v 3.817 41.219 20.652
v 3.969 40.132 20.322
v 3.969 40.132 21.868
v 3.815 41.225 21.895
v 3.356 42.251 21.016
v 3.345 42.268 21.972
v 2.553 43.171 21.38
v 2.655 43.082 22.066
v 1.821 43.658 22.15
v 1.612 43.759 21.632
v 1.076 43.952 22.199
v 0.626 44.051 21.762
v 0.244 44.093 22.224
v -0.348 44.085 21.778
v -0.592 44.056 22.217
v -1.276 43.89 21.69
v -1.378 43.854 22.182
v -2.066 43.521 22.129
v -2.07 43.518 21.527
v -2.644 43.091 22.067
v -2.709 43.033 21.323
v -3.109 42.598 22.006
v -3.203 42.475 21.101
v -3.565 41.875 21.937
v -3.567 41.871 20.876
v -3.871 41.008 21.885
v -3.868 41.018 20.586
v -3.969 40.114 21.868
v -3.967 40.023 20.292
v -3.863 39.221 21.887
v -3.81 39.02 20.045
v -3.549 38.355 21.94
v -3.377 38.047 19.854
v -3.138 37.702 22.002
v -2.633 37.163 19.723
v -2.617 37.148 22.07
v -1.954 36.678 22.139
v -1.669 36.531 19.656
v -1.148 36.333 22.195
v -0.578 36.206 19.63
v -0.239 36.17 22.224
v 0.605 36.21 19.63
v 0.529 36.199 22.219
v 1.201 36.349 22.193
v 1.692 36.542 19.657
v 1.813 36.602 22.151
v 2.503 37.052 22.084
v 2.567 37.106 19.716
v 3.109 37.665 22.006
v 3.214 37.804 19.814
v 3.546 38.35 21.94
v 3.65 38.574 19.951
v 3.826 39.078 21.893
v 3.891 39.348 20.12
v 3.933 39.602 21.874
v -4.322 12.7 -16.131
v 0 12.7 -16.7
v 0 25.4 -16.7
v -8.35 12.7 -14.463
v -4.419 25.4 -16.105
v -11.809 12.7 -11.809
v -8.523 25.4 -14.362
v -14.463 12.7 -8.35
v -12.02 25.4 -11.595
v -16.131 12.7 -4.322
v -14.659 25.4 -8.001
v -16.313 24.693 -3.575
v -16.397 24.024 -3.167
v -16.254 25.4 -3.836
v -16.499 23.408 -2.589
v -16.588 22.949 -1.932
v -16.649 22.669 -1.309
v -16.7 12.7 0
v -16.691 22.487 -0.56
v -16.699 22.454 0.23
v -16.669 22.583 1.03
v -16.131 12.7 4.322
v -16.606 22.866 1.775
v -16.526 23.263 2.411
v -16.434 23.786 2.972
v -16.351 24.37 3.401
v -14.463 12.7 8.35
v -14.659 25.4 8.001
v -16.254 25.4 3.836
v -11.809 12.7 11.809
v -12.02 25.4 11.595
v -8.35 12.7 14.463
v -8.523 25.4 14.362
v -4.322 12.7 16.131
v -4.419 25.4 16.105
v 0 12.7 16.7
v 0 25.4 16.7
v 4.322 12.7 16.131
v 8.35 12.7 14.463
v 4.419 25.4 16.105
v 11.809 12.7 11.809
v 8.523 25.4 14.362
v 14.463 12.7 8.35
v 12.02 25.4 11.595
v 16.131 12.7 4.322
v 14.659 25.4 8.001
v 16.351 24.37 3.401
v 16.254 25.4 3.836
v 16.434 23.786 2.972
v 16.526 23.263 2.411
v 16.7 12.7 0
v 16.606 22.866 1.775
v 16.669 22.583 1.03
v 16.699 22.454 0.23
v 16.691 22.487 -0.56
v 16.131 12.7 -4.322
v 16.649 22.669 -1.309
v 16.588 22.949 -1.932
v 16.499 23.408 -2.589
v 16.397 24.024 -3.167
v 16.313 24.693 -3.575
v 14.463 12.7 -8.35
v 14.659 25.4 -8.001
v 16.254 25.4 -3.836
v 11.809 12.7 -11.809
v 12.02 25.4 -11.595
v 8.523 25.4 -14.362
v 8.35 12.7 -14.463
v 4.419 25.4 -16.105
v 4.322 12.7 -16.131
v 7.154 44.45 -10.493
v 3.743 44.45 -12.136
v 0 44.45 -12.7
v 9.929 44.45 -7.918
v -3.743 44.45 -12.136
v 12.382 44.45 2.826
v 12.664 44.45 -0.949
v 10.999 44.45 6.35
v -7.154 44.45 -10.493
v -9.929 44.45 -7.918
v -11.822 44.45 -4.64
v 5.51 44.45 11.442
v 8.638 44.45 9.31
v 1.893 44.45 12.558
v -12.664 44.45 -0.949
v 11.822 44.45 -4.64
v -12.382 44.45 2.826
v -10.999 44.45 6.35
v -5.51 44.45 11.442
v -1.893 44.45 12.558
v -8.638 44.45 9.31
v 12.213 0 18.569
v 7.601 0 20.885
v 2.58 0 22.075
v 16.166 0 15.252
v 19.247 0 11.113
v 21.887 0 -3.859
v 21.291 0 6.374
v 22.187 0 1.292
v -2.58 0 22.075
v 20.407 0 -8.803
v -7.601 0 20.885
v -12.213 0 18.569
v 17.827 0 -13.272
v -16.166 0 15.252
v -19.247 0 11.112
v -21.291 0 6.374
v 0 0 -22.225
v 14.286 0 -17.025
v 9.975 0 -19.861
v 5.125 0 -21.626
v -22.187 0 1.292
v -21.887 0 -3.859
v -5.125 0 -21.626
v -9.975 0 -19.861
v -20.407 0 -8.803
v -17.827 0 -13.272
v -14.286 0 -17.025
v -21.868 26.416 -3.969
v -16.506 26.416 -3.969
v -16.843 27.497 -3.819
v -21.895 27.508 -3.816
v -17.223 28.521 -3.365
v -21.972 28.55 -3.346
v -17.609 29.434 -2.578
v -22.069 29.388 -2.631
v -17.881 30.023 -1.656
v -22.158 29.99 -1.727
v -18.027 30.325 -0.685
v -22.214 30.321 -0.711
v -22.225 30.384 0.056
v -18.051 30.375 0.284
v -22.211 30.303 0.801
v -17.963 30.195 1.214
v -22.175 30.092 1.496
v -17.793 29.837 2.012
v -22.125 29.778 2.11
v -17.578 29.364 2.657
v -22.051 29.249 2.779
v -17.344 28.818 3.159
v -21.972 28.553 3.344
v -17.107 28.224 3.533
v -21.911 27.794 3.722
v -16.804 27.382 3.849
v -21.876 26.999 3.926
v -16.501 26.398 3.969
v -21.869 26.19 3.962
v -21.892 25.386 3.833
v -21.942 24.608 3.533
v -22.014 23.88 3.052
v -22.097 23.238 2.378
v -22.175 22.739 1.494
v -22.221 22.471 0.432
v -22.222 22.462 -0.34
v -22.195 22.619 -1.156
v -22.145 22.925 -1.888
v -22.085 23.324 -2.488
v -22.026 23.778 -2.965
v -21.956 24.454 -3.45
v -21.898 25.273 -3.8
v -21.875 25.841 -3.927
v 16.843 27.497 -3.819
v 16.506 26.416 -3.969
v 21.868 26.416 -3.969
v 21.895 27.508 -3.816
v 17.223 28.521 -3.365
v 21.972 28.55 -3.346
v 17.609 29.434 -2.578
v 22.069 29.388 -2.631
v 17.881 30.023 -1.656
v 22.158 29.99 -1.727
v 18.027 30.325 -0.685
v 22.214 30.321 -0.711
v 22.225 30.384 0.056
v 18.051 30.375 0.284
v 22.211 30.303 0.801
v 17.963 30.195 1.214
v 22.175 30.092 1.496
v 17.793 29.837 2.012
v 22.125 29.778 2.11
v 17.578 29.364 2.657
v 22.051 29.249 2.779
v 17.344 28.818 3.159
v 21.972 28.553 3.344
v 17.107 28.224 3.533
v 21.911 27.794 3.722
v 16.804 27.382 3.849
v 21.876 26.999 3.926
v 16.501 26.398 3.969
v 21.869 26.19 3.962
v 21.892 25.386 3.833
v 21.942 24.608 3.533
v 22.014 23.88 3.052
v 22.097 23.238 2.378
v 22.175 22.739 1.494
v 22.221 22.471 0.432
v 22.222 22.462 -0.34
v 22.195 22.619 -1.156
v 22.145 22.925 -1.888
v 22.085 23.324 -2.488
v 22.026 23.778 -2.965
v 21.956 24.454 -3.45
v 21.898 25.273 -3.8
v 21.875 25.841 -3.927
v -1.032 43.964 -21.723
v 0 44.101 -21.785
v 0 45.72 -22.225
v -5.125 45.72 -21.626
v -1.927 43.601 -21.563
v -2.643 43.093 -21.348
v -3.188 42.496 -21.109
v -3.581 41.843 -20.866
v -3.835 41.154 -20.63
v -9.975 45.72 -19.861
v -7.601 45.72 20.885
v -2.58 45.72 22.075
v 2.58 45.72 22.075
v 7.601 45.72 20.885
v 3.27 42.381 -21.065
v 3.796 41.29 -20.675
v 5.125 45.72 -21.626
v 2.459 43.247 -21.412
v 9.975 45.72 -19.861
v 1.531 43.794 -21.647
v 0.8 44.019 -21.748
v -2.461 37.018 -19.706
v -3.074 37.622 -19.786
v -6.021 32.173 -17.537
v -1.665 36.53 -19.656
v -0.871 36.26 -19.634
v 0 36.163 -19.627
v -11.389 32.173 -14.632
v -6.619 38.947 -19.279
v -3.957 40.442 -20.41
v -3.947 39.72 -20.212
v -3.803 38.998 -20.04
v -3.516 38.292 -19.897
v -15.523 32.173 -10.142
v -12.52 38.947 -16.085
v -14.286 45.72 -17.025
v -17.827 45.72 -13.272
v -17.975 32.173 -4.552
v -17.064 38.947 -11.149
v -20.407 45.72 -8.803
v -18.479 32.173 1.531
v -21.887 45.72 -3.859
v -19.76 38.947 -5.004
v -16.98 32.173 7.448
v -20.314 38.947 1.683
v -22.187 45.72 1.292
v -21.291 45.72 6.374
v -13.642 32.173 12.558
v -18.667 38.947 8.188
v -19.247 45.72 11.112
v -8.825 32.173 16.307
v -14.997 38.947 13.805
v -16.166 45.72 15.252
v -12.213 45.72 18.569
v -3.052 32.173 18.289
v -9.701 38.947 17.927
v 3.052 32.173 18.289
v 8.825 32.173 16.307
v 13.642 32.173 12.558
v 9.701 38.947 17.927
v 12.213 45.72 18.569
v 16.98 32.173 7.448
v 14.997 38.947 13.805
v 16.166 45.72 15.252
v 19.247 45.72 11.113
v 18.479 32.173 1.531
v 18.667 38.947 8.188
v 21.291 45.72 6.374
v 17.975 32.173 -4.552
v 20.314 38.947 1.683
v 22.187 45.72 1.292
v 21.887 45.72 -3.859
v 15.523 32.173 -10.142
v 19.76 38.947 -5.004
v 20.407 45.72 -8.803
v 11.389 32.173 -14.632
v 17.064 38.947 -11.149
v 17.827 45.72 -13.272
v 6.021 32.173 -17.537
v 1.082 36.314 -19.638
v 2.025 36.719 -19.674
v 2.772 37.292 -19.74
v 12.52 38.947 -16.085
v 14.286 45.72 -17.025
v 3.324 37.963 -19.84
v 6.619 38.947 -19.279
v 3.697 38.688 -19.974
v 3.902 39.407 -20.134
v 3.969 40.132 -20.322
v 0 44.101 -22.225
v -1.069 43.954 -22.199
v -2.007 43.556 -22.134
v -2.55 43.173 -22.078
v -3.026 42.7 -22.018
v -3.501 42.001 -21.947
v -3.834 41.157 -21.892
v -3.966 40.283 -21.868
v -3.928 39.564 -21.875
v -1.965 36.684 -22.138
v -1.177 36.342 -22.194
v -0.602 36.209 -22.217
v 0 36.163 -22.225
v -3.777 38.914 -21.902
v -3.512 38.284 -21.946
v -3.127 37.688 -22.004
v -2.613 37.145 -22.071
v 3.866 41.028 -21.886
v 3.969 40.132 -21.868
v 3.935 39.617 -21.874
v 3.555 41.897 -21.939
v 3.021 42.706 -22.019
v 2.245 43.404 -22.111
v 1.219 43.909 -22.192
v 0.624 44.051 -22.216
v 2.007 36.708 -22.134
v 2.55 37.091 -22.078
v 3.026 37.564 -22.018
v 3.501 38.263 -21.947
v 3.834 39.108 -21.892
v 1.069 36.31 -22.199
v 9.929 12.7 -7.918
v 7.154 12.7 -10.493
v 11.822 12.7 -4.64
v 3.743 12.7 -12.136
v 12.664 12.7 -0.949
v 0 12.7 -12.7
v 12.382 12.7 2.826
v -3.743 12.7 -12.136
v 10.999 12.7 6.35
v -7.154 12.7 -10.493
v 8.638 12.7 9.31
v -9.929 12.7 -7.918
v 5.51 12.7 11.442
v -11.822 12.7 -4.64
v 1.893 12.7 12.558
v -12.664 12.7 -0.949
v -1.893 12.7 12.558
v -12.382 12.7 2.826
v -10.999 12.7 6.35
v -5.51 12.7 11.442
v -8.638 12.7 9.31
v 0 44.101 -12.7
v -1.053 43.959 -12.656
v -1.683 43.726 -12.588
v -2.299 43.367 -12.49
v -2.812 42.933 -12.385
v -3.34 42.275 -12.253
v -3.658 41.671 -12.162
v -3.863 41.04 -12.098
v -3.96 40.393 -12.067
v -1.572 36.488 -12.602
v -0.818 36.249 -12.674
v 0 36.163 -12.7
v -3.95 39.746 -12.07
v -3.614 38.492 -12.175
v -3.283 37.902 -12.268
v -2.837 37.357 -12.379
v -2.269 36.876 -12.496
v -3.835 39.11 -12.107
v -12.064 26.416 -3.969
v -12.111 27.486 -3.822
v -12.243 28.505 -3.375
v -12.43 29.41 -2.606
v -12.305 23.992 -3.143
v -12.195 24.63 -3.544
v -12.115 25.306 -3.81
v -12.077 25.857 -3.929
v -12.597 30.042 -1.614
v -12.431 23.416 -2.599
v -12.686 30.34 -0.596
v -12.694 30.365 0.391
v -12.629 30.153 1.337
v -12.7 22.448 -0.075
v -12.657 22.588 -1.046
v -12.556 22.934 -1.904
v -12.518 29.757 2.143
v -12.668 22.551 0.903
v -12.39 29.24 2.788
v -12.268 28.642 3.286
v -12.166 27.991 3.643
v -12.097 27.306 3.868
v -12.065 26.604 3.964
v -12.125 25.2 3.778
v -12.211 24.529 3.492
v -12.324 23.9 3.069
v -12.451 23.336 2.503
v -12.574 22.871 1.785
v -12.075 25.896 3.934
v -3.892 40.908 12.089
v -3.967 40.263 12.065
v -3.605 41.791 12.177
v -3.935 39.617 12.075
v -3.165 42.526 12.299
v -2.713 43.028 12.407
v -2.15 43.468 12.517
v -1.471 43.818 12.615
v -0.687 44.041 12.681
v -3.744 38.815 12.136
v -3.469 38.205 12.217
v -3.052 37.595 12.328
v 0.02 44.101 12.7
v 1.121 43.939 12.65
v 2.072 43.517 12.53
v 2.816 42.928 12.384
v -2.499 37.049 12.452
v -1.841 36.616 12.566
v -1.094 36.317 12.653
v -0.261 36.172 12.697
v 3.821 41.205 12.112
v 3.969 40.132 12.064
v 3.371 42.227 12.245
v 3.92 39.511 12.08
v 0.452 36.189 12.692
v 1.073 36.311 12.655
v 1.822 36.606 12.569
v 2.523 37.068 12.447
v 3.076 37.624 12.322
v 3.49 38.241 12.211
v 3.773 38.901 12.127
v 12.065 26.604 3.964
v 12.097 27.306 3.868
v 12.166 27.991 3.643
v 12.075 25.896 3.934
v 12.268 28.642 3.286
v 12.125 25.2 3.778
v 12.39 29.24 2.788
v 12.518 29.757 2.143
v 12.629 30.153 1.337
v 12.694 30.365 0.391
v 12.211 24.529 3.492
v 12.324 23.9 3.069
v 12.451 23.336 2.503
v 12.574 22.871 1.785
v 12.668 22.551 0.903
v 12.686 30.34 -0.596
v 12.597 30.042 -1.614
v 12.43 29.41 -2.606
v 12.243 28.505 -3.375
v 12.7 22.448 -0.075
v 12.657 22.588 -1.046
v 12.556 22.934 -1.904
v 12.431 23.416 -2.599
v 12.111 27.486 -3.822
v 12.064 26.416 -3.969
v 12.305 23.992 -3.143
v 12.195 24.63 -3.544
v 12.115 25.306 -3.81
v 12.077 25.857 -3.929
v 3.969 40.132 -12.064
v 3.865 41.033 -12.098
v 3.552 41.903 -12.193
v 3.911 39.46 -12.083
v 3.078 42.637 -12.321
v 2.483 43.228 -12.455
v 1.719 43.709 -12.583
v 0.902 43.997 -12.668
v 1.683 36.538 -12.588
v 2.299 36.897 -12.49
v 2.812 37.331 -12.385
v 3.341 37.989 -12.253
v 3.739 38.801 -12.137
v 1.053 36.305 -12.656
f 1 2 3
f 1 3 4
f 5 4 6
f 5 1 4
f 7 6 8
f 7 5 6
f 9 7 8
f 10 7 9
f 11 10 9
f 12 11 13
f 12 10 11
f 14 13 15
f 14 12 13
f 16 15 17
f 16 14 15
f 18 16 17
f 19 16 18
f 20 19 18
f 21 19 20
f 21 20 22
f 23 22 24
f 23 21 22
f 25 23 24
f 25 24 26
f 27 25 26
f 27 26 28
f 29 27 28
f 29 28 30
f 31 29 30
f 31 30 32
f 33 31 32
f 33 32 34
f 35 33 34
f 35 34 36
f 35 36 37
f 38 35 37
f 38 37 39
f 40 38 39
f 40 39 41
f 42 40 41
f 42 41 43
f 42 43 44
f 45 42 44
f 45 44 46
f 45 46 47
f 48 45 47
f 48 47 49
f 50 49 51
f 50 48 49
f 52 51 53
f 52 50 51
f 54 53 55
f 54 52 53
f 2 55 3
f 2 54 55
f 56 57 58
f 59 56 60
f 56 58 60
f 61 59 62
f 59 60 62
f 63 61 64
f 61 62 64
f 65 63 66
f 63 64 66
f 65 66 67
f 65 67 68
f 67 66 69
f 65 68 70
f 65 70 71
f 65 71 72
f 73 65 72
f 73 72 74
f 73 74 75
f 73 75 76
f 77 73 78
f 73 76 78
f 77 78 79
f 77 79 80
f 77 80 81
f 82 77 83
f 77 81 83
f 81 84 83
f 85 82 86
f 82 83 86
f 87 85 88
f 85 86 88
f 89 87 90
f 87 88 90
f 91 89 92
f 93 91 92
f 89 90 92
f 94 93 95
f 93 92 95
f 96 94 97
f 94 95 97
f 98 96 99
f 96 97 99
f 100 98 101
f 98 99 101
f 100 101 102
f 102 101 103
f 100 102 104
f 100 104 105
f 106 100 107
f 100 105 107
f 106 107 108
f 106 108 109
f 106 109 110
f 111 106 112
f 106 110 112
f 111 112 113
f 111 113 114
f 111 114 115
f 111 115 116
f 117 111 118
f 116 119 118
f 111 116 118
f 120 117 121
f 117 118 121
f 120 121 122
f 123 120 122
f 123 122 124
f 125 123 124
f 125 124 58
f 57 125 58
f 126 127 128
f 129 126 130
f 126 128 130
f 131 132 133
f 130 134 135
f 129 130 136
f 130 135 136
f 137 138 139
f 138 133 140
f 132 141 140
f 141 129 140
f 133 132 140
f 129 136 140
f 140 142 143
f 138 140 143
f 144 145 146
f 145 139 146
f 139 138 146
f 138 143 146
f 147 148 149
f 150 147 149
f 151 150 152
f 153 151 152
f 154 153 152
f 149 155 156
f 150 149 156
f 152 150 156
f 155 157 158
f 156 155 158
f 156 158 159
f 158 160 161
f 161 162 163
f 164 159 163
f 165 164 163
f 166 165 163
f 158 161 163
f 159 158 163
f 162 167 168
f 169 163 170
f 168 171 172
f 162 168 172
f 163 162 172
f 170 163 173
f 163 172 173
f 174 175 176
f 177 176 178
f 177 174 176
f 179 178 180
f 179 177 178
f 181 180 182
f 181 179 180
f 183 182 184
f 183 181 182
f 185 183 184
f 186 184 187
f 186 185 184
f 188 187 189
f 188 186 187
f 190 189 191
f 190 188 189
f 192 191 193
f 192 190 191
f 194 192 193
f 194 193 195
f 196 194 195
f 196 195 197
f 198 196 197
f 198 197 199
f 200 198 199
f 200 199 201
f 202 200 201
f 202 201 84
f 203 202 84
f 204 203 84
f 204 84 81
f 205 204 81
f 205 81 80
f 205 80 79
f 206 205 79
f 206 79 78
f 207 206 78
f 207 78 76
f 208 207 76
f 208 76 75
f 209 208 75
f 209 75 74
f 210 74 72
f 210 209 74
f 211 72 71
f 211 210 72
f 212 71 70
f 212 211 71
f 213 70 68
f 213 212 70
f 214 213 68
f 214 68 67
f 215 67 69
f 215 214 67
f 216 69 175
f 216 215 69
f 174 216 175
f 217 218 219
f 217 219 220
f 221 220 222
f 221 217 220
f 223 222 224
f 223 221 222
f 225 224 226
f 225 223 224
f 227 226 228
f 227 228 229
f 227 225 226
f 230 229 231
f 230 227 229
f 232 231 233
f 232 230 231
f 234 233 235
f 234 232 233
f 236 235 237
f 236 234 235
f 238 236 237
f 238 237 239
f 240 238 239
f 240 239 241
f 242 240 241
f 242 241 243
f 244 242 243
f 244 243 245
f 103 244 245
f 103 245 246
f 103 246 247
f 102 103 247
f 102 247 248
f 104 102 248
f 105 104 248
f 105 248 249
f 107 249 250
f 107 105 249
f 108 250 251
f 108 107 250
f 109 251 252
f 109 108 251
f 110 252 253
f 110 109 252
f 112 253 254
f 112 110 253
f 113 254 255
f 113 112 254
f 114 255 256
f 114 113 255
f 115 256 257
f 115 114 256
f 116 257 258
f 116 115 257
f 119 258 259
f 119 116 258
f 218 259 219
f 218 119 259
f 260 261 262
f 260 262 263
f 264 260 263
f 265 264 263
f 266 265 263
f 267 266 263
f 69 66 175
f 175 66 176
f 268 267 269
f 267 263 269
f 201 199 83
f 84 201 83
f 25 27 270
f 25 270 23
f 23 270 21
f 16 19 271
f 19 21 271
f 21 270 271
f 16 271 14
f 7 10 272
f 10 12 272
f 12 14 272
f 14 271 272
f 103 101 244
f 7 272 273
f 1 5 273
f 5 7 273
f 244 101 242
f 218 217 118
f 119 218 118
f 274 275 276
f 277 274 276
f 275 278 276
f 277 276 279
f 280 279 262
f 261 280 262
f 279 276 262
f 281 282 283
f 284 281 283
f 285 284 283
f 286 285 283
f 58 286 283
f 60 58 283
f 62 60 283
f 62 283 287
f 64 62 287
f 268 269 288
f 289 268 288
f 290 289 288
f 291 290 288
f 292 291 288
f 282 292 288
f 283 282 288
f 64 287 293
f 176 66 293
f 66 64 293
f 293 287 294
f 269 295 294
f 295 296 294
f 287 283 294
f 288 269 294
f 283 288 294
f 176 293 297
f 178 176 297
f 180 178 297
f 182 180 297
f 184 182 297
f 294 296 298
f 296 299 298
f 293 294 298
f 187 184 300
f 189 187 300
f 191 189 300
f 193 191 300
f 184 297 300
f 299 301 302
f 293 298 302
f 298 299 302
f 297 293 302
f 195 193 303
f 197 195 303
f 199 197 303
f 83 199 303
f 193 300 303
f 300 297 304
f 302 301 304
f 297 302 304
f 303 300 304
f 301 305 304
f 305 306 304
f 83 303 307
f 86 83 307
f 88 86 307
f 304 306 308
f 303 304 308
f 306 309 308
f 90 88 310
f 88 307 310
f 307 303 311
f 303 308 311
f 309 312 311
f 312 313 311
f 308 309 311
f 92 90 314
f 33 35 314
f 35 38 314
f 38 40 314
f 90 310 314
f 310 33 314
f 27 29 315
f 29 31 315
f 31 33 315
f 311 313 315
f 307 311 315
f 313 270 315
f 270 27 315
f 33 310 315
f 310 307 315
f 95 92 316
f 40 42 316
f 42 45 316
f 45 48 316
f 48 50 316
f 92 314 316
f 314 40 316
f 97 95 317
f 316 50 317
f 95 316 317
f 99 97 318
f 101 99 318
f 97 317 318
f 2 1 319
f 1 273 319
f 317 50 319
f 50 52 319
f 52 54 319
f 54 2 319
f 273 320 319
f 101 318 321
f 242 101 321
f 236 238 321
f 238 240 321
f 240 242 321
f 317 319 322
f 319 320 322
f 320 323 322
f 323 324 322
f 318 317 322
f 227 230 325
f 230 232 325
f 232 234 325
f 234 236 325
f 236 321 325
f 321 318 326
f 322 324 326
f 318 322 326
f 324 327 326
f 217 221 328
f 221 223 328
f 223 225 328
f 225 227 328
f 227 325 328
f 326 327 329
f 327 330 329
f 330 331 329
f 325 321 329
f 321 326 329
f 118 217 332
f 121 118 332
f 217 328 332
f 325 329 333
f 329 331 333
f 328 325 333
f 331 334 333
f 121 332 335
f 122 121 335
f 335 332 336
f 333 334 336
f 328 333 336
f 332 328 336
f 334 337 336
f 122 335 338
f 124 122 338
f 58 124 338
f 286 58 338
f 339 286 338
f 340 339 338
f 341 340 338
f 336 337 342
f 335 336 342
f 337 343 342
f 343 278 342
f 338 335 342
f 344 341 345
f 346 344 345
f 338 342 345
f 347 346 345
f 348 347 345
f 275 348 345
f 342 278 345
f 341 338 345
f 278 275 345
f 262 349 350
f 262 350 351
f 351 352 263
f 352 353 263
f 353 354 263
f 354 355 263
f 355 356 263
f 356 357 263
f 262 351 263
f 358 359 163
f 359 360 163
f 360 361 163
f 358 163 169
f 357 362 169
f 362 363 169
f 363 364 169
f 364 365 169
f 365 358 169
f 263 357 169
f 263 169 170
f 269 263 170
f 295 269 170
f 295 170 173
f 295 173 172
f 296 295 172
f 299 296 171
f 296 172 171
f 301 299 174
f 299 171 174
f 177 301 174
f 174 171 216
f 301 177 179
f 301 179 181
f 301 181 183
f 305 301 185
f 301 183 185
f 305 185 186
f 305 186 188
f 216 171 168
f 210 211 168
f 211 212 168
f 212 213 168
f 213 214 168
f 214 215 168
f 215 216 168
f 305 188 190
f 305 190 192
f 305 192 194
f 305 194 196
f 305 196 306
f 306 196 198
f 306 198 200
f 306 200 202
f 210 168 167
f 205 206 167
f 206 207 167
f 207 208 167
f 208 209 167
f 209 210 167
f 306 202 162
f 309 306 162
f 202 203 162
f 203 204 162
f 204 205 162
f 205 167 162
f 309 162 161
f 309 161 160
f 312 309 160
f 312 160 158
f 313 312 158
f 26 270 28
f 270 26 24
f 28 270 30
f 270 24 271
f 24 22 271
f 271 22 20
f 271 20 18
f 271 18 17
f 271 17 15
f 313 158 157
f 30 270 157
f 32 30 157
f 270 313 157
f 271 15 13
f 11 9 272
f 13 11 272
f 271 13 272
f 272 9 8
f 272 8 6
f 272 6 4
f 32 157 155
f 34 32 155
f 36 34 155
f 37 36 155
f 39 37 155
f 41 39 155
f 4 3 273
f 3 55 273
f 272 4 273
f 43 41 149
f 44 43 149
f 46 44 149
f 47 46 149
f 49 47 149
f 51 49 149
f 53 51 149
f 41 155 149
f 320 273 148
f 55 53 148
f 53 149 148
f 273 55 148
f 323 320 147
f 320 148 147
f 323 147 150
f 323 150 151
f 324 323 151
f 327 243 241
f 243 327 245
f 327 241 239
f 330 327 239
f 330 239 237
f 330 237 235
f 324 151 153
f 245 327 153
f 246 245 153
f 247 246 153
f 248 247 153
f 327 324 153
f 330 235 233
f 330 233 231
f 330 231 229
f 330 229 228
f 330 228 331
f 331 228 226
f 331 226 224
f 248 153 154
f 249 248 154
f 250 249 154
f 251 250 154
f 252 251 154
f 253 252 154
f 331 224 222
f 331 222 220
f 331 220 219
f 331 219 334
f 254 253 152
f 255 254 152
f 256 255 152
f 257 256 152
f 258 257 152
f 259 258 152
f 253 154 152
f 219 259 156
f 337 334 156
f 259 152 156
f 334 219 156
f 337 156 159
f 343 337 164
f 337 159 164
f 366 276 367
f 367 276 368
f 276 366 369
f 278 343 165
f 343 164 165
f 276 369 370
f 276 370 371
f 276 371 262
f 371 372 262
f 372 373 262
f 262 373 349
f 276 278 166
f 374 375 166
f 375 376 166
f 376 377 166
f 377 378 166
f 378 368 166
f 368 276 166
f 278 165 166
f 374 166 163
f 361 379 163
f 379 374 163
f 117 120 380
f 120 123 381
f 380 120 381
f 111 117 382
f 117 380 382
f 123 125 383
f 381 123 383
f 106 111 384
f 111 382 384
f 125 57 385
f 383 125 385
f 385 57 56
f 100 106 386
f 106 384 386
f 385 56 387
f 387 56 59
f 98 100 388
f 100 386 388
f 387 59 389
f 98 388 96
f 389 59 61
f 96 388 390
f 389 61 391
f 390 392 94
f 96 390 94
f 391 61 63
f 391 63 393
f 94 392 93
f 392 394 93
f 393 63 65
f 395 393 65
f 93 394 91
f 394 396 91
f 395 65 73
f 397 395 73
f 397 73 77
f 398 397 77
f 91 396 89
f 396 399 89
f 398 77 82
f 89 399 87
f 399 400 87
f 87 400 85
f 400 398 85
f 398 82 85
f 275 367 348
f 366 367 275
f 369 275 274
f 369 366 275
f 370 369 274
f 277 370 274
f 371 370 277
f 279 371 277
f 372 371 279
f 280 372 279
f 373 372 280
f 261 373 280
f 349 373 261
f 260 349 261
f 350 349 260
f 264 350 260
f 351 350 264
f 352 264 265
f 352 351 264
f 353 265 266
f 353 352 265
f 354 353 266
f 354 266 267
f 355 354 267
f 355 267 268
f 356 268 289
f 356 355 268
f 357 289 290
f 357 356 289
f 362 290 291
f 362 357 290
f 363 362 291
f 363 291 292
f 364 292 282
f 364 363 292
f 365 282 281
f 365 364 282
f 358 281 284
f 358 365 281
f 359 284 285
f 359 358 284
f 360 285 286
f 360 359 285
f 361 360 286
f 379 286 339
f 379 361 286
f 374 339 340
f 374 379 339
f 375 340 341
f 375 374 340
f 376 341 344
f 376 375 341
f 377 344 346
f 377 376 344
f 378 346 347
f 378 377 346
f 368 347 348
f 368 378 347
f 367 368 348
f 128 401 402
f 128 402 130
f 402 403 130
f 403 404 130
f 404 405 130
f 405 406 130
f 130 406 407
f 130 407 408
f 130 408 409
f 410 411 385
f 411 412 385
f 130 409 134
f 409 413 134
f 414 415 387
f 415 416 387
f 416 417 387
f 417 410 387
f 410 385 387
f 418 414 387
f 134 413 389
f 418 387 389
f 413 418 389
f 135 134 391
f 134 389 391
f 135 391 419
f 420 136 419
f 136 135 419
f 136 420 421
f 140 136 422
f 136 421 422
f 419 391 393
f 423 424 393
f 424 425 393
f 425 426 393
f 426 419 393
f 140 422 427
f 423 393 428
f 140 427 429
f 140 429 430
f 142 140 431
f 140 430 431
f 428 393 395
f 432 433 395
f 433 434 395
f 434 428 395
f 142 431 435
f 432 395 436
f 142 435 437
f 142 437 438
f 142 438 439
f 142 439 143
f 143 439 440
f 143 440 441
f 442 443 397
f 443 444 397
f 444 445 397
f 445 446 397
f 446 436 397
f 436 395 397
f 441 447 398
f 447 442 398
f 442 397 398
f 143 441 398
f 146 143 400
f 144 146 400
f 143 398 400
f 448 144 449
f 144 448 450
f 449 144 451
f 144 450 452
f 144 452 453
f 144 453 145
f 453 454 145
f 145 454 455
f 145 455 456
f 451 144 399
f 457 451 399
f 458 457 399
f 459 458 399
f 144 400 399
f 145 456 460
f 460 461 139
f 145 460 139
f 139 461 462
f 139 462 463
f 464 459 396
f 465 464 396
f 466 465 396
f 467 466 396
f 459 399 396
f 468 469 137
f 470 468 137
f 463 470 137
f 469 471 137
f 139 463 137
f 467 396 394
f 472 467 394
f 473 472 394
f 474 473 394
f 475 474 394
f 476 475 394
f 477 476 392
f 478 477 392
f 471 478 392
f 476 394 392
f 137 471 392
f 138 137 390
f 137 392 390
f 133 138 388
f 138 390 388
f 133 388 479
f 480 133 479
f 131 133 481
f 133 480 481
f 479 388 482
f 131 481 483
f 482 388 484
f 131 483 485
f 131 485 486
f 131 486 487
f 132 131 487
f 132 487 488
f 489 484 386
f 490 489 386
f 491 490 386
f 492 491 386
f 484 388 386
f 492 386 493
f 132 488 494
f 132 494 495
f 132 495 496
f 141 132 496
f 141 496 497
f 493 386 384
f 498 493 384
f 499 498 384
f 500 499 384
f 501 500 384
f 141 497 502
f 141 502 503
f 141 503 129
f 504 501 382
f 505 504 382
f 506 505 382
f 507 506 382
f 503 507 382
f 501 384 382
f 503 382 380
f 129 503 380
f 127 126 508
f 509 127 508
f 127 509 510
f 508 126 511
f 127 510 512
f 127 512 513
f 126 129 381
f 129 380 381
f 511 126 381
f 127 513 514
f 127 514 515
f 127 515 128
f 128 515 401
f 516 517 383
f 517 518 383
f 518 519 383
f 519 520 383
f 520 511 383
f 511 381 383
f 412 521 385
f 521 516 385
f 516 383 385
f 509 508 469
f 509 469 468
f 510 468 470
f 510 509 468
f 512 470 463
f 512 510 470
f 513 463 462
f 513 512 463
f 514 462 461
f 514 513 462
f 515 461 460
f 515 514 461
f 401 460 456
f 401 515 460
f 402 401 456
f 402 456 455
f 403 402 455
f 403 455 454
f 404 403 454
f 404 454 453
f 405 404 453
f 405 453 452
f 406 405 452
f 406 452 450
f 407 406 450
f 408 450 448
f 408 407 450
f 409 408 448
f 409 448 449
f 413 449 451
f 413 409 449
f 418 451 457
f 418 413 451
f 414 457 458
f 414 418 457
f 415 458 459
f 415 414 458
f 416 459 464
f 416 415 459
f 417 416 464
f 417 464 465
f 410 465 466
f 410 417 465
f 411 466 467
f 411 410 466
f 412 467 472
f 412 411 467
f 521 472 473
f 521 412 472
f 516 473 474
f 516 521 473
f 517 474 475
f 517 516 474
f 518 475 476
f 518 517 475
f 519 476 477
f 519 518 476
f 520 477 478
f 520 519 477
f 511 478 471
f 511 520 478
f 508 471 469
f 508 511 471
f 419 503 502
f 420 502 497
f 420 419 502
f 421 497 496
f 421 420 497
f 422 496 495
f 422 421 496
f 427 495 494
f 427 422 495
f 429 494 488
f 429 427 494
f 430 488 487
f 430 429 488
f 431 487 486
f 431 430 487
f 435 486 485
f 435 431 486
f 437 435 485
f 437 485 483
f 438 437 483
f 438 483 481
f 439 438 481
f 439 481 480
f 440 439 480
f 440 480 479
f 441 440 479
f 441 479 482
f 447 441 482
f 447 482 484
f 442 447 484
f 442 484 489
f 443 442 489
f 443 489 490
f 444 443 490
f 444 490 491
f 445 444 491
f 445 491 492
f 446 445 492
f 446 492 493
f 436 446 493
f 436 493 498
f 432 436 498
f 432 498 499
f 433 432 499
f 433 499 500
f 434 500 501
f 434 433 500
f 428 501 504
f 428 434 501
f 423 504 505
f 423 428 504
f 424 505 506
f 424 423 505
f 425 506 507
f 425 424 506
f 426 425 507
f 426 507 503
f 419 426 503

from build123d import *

# Parameters (mm, degrees)
CUT_EXTRUDE1_DEPTH      = 56.481705543
CUT_EXTRUDE1_DEPTH_BACK = 56.481705543
SKETCH2_R               = 3.96875
CUT_EXTRUDE2_DEPTH      = 56.481705706
CUT_EXTRUDE2_DEPTH_BACK = 56.481705706
SKETCH4_R               = 3.96875


with BuildPart() as part:
    # Sketch1 → Revolve1 (revolve)
    with BuildSketch(Plane.YZ, mode=Mode.PRIVATE) as revolve1_sk:
        Polygon((0, 0), (44.45, 0), (44.45, 12.7), (12.7, 12.7), (12.7, 16.7005), (25.4, 16.7005), (45.72, 22.225), (0, 22.225), align=None)
    revolve(revolve1_sk.sketch.rotate(Axis((0, 0, 0), (0, 1, 0)), 180), axis=Axis((0, 0, 0), (0, 1, 0)))

    # Sketch2 → Cut-Extrude1 (cut, two sides: drawn at the far end of the back side and taken through both)
    with BuildSketch(Plane(origin=(0, 0, 0), x_dir=(0, 1, 0), z_dir=(0, 0, 1)).offset(-CUT_EXTRUDE1_DEPTH_BACK)):
        with Locations(Location((40.132, 0, 0), (0, 0, 270))):
            Circle(SKETCH2_R)
    extrude(amount=CUT_EXTRUDE1_DEPTH + CUT_EXTRUDE1_DEPTH_BACK, mode=Mode.SUBTRACT)

    # Sketch4 → Cut-Extrude2 (cut, two sides: drawn at the far end of the back side and taken through both)
    with BuildSketch(Plane.YZ.offset(-CUT_EXTRUDE2_DEPTH_BACK)):
        with Locations(Location((26.416, 0, 0), (0, 0, 270))):
            Circle(SKETCH4_R)
    extrude(amount=CUT_EXTRUDE2_DEPTH + CUT_EXTRUDE2_DEPTH_BACK, mode=Mode.SUBTRACT)


solid = part.part
